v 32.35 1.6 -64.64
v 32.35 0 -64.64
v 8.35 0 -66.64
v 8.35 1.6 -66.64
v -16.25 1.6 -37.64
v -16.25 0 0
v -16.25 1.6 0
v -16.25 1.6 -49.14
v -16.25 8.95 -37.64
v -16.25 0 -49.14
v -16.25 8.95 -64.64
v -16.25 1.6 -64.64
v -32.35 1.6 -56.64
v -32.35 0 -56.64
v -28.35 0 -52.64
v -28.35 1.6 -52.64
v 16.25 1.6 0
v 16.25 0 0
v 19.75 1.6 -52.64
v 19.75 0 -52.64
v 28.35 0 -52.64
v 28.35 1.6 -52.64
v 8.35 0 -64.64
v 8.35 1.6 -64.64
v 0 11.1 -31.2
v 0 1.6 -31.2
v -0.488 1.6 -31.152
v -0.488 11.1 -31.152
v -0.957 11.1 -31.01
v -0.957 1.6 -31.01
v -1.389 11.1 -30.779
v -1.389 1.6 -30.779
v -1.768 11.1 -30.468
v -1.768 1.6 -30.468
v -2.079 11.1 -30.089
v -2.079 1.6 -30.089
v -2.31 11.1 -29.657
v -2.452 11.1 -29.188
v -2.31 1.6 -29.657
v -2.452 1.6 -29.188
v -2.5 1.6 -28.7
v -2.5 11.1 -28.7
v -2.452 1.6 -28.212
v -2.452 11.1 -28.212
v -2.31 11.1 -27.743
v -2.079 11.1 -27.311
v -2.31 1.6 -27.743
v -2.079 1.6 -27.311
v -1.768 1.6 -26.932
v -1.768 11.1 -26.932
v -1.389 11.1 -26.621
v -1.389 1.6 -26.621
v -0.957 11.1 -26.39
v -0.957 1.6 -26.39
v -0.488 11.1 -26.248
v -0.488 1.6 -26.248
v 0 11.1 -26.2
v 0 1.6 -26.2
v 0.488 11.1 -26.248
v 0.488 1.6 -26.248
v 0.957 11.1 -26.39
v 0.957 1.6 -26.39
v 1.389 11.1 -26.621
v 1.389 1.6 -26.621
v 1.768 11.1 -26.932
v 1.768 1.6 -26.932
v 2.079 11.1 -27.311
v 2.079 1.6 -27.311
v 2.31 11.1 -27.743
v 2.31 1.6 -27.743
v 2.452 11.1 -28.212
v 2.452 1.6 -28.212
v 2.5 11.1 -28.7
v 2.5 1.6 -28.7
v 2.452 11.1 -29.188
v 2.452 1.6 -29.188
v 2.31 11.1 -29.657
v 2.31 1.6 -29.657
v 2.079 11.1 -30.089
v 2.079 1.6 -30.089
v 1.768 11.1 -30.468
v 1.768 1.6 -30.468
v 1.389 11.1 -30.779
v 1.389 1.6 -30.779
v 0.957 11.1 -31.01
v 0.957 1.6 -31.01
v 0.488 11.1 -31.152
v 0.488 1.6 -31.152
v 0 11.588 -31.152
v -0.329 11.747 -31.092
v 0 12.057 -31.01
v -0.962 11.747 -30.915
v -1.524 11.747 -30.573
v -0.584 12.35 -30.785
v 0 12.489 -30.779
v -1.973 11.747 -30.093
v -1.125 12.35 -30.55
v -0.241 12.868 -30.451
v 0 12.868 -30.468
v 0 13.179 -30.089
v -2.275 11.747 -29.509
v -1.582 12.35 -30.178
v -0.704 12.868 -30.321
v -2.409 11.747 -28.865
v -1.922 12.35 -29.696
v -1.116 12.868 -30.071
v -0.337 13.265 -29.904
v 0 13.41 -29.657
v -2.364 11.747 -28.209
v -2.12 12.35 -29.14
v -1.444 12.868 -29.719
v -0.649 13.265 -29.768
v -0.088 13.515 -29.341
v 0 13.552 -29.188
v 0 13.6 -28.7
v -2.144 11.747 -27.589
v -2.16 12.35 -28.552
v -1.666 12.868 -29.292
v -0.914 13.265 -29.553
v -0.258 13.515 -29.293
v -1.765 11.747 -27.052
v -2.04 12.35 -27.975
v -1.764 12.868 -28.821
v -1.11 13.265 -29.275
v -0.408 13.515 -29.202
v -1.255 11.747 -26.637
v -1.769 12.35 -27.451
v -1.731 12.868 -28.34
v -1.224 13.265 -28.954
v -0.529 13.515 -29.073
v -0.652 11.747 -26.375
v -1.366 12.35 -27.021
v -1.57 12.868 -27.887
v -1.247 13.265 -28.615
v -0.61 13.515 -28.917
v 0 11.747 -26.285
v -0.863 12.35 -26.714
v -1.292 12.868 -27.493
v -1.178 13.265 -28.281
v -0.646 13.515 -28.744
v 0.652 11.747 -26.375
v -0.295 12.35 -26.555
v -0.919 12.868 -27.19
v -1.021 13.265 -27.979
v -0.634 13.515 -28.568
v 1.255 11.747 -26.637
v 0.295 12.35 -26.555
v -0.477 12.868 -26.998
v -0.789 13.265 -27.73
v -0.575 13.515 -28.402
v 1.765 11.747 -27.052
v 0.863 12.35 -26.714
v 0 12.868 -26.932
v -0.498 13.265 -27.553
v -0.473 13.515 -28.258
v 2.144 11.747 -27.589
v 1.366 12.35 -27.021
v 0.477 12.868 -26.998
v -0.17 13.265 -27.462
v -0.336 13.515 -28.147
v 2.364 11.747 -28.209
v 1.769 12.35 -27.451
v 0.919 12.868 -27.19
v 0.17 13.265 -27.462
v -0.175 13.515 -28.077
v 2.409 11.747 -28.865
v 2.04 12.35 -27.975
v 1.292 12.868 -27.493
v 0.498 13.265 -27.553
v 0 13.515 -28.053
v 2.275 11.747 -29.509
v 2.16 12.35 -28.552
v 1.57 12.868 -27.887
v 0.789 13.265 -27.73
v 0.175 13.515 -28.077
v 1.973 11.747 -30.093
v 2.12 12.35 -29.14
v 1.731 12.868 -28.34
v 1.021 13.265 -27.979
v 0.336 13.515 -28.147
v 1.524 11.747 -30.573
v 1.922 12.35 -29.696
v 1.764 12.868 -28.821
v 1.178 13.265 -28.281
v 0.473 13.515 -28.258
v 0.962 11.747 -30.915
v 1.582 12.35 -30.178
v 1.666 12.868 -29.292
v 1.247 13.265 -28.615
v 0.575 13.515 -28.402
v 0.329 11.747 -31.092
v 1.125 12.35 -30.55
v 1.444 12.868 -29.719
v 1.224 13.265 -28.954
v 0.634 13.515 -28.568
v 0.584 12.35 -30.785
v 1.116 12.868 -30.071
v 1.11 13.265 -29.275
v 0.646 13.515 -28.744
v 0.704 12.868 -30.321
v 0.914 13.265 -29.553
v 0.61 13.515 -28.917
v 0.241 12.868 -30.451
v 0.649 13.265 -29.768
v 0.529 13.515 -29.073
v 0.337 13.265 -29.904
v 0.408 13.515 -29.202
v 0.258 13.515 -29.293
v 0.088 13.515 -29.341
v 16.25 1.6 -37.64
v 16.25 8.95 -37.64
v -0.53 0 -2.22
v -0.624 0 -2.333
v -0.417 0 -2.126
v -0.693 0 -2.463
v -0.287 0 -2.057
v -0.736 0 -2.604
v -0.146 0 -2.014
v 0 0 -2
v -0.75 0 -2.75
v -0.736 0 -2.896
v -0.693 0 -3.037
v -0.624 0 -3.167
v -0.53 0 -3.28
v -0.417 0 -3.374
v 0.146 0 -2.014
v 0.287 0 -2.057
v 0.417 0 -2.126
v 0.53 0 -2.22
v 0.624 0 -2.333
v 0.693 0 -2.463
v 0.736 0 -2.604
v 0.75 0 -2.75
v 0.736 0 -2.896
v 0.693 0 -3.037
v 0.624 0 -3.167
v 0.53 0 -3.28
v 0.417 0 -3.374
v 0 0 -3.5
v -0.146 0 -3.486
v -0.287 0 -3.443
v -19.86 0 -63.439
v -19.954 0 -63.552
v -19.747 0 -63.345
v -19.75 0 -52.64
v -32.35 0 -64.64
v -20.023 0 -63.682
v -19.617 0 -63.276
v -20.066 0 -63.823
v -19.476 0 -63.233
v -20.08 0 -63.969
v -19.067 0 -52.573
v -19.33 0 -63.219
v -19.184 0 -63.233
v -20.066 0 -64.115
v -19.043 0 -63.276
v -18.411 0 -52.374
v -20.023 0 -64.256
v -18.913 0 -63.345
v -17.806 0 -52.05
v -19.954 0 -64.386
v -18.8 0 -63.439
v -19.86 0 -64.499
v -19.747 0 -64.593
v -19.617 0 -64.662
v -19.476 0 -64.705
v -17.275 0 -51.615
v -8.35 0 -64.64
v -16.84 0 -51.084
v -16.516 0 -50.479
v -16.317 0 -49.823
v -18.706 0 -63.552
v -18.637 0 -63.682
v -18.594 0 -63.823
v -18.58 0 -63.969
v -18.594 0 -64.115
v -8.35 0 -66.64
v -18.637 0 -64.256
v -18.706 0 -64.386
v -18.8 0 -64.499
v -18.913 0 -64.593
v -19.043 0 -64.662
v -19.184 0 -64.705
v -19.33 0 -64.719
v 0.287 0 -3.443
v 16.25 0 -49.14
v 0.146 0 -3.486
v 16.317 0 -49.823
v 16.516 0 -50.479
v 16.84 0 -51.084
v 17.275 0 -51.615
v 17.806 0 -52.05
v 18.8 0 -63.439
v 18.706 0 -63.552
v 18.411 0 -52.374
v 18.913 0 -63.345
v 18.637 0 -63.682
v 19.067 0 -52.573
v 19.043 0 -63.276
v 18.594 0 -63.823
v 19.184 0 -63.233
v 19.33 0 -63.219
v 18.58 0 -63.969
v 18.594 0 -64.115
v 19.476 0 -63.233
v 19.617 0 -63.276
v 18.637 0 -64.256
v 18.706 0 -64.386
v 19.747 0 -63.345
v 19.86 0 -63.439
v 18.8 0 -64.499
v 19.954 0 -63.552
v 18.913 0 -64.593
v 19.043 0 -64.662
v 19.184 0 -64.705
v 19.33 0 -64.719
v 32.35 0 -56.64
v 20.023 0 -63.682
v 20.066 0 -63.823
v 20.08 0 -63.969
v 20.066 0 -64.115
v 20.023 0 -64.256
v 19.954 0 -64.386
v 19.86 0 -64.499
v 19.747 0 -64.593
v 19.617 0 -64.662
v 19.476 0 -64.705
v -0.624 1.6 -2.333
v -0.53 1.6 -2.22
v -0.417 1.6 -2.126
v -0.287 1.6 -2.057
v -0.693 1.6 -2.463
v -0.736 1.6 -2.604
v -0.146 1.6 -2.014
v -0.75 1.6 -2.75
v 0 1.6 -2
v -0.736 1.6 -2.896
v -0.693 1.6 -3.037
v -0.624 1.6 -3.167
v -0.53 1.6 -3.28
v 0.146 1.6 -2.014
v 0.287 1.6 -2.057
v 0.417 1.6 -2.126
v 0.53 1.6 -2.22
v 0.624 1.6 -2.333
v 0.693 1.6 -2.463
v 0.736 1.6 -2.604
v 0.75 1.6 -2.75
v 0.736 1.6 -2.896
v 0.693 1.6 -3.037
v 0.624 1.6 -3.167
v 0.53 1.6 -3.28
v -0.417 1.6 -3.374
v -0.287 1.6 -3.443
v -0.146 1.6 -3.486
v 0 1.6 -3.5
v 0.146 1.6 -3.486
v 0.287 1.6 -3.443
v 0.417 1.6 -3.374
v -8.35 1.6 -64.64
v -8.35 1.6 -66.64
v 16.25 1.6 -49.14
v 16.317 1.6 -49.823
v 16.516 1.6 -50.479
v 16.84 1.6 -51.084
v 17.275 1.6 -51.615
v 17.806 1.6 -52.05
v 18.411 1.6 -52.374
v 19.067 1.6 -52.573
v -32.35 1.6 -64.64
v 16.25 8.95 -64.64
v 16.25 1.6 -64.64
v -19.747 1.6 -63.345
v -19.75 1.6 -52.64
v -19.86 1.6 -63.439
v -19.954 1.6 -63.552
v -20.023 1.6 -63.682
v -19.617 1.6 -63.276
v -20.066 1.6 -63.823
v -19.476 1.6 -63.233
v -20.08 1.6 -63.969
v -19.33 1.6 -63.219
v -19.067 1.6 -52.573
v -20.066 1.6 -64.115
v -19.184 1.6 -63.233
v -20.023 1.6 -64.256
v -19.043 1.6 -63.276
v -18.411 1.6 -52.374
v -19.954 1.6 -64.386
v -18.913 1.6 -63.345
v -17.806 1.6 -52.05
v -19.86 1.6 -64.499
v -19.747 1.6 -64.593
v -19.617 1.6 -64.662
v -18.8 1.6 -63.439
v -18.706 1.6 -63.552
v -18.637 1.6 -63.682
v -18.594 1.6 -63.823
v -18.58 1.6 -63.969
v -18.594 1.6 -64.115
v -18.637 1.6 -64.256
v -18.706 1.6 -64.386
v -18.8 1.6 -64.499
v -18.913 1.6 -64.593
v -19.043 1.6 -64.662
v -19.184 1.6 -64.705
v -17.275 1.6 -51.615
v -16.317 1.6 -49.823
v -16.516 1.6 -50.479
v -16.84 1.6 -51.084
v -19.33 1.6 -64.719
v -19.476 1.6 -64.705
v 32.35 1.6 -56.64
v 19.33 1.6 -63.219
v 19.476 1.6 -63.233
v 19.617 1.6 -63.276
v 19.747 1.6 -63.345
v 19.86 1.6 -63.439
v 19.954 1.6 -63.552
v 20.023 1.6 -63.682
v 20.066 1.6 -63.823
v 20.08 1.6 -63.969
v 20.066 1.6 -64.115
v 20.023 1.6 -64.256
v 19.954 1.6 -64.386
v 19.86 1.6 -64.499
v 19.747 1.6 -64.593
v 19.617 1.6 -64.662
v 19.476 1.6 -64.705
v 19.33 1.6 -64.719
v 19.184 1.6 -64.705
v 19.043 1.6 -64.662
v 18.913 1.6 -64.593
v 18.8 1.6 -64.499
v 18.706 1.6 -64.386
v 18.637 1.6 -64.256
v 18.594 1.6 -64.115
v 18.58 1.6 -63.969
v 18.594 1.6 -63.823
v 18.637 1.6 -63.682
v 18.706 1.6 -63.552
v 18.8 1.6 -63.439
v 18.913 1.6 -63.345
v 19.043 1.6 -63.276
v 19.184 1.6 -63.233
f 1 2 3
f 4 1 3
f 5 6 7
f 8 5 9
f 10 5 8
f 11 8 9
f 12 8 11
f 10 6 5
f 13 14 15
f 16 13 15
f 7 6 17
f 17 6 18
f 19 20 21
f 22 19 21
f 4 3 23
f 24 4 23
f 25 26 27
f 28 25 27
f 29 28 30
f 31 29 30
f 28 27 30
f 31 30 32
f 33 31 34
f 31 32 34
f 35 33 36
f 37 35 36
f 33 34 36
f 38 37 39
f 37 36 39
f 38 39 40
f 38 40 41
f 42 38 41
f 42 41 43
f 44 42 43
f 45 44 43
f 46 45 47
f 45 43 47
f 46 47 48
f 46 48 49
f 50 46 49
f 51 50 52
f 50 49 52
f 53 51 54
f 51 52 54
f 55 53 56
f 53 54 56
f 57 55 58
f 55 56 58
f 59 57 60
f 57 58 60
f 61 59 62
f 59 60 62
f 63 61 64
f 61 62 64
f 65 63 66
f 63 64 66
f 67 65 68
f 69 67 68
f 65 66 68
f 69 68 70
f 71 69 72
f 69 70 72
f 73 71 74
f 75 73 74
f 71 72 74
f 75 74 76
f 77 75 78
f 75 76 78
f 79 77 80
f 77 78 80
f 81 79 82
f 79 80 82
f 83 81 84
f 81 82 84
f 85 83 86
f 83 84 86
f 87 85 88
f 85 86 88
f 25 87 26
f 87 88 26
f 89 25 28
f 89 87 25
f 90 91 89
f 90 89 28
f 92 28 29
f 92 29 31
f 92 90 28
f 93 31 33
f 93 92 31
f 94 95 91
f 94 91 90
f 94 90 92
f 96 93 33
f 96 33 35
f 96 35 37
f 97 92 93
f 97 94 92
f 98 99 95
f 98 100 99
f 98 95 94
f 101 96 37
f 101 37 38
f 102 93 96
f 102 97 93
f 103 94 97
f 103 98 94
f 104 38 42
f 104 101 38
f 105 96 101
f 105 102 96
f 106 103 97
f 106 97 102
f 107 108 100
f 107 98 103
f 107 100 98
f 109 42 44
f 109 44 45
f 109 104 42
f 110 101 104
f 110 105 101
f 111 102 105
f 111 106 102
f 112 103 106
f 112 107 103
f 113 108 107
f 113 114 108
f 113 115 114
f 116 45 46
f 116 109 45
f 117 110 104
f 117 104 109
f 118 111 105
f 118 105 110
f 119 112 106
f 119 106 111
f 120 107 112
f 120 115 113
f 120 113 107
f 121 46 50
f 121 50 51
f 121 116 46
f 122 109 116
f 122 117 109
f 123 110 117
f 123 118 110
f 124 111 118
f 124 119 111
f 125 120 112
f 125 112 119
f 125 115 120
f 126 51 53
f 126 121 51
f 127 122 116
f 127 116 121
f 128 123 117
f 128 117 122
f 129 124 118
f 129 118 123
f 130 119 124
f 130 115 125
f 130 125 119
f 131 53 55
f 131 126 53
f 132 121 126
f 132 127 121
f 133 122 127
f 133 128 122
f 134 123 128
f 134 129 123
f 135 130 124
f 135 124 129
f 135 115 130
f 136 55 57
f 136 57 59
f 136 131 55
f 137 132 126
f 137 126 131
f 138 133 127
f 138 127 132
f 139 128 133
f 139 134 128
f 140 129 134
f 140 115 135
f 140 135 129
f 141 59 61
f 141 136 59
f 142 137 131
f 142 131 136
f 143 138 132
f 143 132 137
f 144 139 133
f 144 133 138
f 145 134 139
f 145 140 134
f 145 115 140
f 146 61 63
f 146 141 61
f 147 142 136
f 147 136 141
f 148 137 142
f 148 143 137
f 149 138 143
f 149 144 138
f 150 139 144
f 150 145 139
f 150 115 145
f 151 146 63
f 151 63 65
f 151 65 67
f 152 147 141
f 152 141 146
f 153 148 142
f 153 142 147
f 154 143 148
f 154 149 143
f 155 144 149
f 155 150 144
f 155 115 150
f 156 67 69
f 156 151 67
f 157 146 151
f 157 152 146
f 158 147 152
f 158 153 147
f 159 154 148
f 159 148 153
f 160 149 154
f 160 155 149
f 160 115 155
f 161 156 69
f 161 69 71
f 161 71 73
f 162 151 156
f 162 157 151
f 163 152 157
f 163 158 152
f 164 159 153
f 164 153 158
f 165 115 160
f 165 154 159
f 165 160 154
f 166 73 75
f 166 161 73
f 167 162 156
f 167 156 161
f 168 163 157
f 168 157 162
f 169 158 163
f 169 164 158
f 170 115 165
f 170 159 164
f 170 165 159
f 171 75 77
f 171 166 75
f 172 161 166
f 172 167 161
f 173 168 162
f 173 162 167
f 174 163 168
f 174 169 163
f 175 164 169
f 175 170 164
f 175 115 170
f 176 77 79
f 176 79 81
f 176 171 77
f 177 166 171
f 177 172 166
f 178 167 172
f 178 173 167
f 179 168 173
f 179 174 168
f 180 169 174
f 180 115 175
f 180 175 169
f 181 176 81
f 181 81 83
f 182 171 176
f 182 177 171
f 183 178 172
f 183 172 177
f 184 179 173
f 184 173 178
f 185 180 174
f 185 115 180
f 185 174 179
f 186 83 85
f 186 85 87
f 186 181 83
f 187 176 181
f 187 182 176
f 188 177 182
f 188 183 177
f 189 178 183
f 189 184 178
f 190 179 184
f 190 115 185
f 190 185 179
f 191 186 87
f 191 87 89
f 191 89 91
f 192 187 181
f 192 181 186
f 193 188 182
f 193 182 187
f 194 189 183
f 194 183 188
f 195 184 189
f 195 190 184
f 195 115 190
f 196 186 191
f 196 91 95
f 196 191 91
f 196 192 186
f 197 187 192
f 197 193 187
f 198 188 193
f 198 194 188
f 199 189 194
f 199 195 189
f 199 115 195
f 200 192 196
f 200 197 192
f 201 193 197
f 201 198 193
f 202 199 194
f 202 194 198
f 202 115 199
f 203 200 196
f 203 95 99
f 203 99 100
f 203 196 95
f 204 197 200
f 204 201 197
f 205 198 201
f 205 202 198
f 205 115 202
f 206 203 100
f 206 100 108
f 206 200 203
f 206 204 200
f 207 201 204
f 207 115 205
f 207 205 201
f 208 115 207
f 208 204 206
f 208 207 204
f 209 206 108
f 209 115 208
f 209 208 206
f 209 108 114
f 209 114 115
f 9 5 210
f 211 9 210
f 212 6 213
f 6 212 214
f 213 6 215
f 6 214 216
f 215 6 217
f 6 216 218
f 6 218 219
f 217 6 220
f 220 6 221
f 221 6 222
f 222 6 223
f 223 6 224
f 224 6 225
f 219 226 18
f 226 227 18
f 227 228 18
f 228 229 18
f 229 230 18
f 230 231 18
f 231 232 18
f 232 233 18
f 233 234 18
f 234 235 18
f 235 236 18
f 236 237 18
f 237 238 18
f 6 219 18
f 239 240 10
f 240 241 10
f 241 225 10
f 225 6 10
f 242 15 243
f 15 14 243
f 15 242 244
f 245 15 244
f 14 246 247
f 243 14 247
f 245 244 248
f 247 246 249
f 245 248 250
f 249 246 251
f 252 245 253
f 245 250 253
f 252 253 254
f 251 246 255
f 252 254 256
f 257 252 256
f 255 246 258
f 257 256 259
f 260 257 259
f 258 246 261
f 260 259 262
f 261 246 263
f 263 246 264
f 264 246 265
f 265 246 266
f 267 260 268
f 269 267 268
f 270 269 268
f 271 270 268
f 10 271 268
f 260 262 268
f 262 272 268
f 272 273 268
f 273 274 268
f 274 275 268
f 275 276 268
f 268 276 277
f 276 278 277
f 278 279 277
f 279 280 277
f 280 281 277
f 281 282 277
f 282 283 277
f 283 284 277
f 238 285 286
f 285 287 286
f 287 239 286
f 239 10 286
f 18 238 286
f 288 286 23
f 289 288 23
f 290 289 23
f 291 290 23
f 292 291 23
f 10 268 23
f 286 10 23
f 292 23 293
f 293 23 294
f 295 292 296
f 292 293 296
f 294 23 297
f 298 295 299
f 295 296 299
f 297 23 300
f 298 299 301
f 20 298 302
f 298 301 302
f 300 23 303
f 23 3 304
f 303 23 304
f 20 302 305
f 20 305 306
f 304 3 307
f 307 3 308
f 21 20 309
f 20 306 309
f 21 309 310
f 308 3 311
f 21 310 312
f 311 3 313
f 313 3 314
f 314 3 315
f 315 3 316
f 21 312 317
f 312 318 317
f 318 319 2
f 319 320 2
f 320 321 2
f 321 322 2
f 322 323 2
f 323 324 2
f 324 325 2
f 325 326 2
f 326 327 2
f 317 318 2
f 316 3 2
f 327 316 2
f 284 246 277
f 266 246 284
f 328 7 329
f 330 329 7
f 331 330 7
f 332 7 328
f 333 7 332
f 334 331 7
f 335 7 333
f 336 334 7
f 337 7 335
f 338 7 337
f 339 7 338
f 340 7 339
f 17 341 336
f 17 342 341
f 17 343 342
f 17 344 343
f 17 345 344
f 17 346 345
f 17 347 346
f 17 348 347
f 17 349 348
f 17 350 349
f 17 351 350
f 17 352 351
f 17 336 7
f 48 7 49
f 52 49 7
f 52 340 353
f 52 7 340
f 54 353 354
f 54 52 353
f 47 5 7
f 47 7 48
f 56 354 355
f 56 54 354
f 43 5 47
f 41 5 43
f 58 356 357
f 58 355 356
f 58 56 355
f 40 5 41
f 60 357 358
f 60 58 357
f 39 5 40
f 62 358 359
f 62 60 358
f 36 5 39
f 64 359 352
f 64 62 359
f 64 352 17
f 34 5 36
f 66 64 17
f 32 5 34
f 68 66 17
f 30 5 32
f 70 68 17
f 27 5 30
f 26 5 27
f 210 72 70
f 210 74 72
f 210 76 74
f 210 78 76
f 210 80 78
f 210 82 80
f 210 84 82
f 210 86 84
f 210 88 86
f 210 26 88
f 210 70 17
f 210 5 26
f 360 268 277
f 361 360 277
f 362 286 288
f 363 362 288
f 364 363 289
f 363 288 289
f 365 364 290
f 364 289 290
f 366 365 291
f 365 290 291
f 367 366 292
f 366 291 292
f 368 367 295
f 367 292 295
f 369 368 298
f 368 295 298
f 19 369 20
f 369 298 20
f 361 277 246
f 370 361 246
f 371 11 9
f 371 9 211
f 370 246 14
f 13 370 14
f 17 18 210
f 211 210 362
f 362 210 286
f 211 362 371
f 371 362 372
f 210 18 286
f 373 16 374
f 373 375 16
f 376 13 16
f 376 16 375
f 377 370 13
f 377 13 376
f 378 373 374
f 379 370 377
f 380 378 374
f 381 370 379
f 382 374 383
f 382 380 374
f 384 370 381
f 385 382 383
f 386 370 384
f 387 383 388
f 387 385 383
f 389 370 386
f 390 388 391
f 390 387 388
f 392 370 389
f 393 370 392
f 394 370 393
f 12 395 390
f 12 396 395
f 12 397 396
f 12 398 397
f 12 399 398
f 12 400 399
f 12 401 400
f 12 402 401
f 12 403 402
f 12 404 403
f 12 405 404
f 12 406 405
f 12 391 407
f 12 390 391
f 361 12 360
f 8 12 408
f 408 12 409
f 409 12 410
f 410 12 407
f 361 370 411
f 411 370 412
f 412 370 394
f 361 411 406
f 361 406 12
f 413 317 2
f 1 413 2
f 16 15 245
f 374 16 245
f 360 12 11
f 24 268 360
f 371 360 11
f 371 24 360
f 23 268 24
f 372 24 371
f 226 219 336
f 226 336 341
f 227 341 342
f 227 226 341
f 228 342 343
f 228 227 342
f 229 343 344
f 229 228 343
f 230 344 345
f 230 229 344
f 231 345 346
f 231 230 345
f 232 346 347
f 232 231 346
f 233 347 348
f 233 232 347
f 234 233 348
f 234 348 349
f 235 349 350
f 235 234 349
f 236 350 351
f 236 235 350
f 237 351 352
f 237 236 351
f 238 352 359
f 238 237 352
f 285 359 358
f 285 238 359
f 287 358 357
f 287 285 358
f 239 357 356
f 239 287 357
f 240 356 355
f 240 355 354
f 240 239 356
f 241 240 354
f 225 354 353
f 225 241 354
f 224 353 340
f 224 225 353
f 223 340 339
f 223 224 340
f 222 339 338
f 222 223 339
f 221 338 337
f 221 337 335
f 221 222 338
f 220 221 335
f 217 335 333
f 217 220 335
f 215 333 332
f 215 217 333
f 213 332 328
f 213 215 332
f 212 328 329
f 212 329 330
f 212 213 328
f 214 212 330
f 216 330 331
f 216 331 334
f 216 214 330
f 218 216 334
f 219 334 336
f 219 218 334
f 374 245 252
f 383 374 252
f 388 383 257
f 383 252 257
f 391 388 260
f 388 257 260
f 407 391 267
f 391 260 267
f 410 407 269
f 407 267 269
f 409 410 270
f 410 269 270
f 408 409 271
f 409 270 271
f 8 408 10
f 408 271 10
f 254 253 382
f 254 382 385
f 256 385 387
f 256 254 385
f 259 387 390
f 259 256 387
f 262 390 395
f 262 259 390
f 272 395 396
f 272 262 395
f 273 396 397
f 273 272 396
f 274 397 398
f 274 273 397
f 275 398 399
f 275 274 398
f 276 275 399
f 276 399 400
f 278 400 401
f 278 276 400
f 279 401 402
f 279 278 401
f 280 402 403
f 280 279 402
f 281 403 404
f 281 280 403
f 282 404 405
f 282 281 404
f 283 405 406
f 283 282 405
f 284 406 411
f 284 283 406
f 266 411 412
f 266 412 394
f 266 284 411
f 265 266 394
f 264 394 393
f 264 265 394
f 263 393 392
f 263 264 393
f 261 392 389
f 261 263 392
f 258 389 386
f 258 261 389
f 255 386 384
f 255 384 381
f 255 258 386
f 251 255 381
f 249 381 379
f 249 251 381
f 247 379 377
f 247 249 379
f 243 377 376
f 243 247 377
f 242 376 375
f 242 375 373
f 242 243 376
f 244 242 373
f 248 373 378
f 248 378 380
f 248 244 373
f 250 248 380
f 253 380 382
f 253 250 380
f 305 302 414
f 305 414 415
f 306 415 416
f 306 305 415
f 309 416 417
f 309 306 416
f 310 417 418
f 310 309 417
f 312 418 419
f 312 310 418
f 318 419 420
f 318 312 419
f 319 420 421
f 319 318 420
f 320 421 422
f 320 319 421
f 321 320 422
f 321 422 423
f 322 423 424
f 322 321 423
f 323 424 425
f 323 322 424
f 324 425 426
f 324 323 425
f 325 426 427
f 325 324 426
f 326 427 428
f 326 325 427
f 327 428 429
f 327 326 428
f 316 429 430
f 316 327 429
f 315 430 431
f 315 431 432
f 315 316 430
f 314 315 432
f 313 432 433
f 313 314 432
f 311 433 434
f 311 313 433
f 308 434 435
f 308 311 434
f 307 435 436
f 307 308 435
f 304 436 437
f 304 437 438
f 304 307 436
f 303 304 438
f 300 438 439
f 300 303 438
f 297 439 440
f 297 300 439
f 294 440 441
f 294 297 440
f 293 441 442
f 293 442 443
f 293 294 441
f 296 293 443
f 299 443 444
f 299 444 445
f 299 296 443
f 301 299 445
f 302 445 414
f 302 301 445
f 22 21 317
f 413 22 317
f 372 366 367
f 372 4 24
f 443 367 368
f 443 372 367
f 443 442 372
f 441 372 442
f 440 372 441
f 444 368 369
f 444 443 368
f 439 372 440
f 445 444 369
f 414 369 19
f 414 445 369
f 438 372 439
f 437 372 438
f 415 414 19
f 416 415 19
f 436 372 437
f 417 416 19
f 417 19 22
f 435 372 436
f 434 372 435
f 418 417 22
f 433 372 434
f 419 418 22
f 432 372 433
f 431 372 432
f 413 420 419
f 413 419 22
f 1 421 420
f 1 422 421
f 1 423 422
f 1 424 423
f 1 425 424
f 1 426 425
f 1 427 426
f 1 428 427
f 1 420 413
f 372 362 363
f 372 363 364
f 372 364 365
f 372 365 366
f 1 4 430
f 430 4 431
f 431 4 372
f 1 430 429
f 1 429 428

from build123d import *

# Parameters (mm, degrees)
SKETCH1_R           = 0.75
BOSS_EXTRUDE1_DEPTH = 1.6
SKETCH2_W           = 32.5
SKETCH2_H           = 27
BOSS_EXTRUDE2_DEPTH = 7.35
SKETCH3_R           = 2.5
BOSS_EXTRUDE3_DEPTH = 12
FILLET1_R           = 2.5


with BuildPart() as part:
    # Sketch1 → Boss-Extrude1 (new body)
    with BuildSketch(Plane(origin=(0, 0, 0), x_dir=(1, 0, 0), z_dir=(0, 1, 0))):
        with BuildLine():
            Line((-16.25, 0), (16.25, 0))
            Line((16.25, 0), (16.25, 49.14))
            ThreePointArc((16.25, 49.14), (17.275126266, 51.614873734), (19.75, 52.64))
            Line((19.75, 52.64), (28.35, 52.64))
            Line((28.35, 52.64), (32.35, 56.64))
            Line((32.35, 56.64), (32.35, 64.64))
            Line((32.35, 64.64), (8.35, 66.64))
            Line((8.35, 66.64), (8.35, 64.64))
            Line((8.35, 64.64), (-8.35, 64.64))
            Line((-8.35, 64.64), (-8.35, 66.64))
            Line((-8.35, 66.64), (-32.35, 64.64))
            Line((-32.35, 64.64), (-32.35, 56.64))
            Line((-32.35, 56.64), (-28.35, 52.64))
            Line((-28.35, 52.64), (-19.75, 52.64))
            ThreePointArc((-19.75, 52.64), (-17.275126266, 51.614873734), (-16.25, 49.14))
            Line((-16.25, 49.14), (-16.25, 0))
        make_face()
        with Locations(Location((-19.33, 63.968934124, 0), (0, 0, 270))):
            Circle(SKETCH1_R, mode=Mode.SUBTRACT)
        with Locations(Location((19.33, 63.968934124, 0), (0, 0, 270))):
            Circle(SKETCH1_R, mode=Mode.SUBTRACT)
        with Locations(Location((0, 2.75, 0), (0, 0, 270))):
            Circle(SKETCH1_R, mode=Mode.SUBTRACT)
    extrude(amount=BOSS_EXTRUDE1_DEPTH)

    # Sketch2 → Boss-Extrude2 (add)
    with BuildSketch(Plane(origin=(0, 1.6, 0), x_dir=(1, 0, 0), z_dir=(0, 1, 0))):
        with Locations((0, 51.14)):
            Rectangle(SKETCH2_W, SKETCH2_H)
    extrude(amount=BOSS_EXTRUDE2_DEPTH)

    # Sketch3 → Boss-Extrude3 (add)
    with BuildSketch(Plane(origin=(0, 1.6, 0), x_dir=(1, 0, 0), z_dir=(0, 1, 0))):
        with Locations(Location((0, 28.7, 0), (0, 0, 90))):
            Circle(SKETCH3_R)
    extrude(amount=BOSS_EXTRUDE3_DEPTH)

    # Fillet1
    fillet1_edges = [part.edges().sort_by_distance(p)[0] for p in [
        (0, 13.6, -26.2),
    ]]
    fillet(fillet1_edges, radius=FILLET1_R)


solid = part.part
